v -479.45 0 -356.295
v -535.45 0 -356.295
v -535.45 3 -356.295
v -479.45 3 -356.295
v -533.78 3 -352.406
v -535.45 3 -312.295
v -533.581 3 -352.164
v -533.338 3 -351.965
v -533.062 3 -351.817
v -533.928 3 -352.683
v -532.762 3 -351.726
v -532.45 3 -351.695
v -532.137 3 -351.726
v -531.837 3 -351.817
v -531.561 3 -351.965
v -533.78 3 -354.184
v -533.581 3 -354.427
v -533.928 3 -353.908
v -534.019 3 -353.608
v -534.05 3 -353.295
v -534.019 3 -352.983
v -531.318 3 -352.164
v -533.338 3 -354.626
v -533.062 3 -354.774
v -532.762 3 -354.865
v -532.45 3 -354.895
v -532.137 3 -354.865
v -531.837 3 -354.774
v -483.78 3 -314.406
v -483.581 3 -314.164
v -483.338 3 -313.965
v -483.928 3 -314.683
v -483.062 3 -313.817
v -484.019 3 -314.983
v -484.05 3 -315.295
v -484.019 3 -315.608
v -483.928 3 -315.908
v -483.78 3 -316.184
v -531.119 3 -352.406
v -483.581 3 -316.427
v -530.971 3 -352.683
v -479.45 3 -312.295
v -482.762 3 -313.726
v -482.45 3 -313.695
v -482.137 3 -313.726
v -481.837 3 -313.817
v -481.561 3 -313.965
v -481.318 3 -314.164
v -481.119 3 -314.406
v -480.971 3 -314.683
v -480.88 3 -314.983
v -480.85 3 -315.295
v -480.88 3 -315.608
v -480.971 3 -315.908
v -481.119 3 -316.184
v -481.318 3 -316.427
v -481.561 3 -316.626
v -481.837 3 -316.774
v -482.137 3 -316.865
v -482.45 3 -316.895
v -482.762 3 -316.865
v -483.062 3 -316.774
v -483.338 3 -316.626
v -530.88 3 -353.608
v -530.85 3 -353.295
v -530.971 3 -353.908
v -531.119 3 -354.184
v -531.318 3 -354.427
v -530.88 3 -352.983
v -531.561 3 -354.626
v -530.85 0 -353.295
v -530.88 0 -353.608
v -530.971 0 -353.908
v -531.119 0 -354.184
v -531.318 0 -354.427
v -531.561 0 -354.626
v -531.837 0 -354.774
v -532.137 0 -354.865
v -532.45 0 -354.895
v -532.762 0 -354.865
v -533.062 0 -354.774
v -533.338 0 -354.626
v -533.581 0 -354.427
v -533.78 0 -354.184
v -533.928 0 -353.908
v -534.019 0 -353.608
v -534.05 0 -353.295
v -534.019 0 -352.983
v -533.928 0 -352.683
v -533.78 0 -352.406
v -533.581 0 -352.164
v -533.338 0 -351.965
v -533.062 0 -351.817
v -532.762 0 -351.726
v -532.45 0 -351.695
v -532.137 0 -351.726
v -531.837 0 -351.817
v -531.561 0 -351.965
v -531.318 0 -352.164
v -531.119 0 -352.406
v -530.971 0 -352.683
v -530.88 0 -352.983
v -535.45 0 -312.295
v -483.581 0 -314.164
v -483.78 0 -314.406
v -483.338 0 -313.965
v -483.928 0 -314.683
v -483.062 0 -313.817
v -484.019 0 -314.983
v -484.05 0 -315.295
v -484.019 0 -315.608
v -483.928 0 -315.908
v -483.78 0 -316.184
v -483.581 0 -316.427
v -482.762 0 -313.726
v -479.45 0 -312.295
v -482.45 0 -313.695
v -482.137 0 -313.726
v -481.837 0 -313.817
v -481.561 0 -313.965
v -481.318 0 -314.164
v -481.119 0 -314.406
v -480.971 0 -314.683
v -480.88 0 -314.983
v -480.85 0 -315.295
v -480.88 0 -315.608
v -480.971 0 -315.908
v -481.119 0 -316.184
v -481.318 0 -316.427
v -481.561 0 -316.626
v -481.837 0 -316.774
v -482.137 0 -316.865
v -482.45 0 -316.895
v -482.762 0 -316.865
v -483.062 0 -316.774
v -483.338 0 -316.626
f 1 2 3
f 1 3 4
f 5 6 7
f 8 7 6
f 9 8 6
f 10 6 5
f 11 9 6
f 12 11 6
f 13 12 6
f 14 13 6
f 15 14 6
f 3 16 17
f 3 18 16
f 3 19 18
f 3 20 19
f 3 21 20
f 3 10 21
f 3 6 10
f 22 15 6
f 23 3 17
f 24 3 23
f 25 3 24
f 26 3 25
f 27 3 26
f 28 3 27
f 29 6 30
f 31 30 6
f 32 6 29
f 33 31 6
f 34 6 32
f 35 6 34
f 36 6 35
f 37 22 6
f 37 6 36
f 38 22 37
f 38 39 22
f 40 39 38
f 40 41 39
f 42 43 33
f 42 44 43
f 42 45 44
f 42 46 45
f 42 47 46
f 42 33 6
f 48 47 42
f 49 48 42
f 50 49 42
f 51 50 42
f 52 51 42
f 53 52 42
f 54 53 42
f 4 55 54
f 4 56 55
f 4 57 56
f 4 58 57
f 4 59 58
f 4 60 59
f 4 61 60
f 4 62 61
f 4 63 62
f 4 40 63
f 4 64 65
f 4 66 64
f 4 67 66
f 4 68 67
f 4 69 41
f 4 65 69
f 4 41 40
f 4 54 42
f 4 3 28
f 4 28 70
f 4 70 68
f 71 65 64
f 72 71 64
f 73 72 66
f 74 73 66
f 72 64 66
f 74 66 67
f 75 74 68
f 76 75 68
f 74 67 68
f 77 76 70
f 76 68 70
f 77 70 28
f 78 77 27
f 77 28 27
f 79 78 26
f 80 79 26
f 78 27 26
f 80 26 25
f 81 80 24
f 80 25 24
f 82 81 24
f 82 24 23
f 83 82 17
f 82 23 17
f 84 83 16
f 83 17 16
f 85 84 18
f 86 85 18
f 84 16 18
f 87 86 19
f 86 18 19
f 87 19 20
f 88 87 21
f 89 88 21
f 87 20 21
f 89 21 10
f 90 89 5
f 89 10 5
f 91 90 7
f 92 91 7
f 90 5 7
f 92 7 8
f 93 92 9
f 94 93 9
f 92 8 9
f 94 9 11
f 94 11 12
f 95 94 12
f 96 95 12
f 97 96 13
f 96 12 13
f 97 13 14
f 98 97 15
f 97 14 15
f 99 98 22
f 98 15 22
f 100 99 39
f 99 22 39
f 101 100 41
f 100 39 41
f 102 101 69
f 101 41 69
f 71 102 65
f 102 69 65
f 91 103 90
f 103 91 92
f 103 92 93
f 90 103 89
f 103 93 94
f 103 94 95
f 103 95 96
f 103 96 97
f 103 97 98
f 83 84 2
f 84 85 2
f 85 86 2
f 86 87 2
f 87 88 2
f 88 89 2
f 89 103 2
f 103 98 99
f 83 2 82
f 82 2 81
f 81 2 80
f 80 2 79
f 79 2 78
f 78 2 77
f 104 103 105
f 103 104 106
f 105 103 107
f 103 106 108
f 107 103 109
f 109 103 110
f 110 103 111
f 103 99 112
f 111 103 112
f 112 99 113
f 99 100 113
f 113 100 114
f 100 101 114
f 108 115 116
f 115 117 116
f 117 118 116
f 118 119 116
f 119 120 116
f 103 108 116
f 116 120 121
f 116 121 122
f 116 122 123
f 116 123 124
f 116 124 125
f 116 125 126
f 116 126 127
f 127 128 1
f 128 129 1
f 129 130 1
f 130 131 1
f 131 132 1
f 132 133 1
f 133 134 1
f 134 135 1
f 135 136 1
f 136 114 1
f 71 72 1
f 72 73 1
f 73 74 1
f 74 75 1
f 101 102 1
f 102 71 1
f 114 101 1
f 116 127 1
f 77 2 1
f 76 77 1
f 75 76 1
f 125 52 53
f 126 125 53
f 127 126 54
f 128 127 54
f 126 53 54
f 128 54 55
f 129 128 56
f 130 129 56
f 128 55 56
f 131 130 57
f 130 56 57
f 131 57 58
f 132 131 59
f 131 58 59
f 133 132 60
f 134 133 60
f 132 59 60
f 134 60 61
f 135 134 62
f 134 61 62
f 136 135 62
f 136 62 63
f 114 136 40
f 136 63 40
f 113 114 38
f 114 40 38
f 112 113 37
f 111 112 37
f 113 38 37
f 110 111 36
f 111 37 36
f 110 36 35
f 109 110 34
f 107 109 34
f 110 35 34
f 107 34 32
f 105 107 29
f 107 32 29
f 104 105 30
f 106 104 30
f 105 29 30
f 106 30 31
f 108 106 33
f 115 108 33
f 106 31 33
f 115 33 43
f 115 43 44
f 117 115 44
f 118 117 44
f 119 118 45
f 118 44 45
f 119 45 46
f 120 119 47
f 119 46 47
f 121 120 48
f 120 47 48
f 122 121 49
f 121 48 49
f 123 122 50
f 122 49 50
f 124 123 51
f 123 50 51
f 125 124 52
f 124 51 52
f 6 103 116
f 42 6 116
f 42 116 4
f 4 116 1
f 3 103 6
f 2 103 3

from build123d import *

# Parameters (mm, degrees)
SKETCH1_W           = 56
SKETCH1_H           = 44
BOSS_EXTRUDE1_DEPTH = 3
SKETCH2_R           = 1.6
CUT_EXTRUDE1_DEPTH  = 3
SKETCH4_R           = 1.6
CUT_EXTRUDE2_DEPTH  = 3


with BuildPart() as part:
    # Sketch1 → Boss-Extrude1 (new body)
    with BuildSketch(Plane(origin=(0, 0, 0), x_dir=(1, 0, 0), z_dir=(0, 1, 0))):
        with Locations((-507.449567723, 334.295389049)):
            Rectangle(SKETCH1_W, SKETCH1_H)
    extrude(amount=BOSS_EXTRUDE1_DEPTH)

    # Sketch2 → Cut-Extrude1 (cut)
    with BuildSketch(Plane(origin=(0, 3, 0), x_dir=(1, 0, 0), z_dir=(0, 1, 0))):
        with Locations((-532.449567723, 353.295389049)):
            Circle(SKETCH2_R)
    extrude(amount=-CUT_EXTRUDE1_DEPTH, mode=Mode.SUBTRACT)

    # Sketch4 → Cut-Extrude2 (cut)
    with BuildSketch(Plane(origin=(0, 3, 0), x_dir=(1, 0, 0), z_dir=(0, 1, 0))):
        with Locations((-482.449567723, 315.295389049)):
            Circle(SKETCH4_R)
    extrude(amount=-CUT_EXTRUDE2_DEPTH, mode=Mode.SUBTRACT)


solid = part.part
